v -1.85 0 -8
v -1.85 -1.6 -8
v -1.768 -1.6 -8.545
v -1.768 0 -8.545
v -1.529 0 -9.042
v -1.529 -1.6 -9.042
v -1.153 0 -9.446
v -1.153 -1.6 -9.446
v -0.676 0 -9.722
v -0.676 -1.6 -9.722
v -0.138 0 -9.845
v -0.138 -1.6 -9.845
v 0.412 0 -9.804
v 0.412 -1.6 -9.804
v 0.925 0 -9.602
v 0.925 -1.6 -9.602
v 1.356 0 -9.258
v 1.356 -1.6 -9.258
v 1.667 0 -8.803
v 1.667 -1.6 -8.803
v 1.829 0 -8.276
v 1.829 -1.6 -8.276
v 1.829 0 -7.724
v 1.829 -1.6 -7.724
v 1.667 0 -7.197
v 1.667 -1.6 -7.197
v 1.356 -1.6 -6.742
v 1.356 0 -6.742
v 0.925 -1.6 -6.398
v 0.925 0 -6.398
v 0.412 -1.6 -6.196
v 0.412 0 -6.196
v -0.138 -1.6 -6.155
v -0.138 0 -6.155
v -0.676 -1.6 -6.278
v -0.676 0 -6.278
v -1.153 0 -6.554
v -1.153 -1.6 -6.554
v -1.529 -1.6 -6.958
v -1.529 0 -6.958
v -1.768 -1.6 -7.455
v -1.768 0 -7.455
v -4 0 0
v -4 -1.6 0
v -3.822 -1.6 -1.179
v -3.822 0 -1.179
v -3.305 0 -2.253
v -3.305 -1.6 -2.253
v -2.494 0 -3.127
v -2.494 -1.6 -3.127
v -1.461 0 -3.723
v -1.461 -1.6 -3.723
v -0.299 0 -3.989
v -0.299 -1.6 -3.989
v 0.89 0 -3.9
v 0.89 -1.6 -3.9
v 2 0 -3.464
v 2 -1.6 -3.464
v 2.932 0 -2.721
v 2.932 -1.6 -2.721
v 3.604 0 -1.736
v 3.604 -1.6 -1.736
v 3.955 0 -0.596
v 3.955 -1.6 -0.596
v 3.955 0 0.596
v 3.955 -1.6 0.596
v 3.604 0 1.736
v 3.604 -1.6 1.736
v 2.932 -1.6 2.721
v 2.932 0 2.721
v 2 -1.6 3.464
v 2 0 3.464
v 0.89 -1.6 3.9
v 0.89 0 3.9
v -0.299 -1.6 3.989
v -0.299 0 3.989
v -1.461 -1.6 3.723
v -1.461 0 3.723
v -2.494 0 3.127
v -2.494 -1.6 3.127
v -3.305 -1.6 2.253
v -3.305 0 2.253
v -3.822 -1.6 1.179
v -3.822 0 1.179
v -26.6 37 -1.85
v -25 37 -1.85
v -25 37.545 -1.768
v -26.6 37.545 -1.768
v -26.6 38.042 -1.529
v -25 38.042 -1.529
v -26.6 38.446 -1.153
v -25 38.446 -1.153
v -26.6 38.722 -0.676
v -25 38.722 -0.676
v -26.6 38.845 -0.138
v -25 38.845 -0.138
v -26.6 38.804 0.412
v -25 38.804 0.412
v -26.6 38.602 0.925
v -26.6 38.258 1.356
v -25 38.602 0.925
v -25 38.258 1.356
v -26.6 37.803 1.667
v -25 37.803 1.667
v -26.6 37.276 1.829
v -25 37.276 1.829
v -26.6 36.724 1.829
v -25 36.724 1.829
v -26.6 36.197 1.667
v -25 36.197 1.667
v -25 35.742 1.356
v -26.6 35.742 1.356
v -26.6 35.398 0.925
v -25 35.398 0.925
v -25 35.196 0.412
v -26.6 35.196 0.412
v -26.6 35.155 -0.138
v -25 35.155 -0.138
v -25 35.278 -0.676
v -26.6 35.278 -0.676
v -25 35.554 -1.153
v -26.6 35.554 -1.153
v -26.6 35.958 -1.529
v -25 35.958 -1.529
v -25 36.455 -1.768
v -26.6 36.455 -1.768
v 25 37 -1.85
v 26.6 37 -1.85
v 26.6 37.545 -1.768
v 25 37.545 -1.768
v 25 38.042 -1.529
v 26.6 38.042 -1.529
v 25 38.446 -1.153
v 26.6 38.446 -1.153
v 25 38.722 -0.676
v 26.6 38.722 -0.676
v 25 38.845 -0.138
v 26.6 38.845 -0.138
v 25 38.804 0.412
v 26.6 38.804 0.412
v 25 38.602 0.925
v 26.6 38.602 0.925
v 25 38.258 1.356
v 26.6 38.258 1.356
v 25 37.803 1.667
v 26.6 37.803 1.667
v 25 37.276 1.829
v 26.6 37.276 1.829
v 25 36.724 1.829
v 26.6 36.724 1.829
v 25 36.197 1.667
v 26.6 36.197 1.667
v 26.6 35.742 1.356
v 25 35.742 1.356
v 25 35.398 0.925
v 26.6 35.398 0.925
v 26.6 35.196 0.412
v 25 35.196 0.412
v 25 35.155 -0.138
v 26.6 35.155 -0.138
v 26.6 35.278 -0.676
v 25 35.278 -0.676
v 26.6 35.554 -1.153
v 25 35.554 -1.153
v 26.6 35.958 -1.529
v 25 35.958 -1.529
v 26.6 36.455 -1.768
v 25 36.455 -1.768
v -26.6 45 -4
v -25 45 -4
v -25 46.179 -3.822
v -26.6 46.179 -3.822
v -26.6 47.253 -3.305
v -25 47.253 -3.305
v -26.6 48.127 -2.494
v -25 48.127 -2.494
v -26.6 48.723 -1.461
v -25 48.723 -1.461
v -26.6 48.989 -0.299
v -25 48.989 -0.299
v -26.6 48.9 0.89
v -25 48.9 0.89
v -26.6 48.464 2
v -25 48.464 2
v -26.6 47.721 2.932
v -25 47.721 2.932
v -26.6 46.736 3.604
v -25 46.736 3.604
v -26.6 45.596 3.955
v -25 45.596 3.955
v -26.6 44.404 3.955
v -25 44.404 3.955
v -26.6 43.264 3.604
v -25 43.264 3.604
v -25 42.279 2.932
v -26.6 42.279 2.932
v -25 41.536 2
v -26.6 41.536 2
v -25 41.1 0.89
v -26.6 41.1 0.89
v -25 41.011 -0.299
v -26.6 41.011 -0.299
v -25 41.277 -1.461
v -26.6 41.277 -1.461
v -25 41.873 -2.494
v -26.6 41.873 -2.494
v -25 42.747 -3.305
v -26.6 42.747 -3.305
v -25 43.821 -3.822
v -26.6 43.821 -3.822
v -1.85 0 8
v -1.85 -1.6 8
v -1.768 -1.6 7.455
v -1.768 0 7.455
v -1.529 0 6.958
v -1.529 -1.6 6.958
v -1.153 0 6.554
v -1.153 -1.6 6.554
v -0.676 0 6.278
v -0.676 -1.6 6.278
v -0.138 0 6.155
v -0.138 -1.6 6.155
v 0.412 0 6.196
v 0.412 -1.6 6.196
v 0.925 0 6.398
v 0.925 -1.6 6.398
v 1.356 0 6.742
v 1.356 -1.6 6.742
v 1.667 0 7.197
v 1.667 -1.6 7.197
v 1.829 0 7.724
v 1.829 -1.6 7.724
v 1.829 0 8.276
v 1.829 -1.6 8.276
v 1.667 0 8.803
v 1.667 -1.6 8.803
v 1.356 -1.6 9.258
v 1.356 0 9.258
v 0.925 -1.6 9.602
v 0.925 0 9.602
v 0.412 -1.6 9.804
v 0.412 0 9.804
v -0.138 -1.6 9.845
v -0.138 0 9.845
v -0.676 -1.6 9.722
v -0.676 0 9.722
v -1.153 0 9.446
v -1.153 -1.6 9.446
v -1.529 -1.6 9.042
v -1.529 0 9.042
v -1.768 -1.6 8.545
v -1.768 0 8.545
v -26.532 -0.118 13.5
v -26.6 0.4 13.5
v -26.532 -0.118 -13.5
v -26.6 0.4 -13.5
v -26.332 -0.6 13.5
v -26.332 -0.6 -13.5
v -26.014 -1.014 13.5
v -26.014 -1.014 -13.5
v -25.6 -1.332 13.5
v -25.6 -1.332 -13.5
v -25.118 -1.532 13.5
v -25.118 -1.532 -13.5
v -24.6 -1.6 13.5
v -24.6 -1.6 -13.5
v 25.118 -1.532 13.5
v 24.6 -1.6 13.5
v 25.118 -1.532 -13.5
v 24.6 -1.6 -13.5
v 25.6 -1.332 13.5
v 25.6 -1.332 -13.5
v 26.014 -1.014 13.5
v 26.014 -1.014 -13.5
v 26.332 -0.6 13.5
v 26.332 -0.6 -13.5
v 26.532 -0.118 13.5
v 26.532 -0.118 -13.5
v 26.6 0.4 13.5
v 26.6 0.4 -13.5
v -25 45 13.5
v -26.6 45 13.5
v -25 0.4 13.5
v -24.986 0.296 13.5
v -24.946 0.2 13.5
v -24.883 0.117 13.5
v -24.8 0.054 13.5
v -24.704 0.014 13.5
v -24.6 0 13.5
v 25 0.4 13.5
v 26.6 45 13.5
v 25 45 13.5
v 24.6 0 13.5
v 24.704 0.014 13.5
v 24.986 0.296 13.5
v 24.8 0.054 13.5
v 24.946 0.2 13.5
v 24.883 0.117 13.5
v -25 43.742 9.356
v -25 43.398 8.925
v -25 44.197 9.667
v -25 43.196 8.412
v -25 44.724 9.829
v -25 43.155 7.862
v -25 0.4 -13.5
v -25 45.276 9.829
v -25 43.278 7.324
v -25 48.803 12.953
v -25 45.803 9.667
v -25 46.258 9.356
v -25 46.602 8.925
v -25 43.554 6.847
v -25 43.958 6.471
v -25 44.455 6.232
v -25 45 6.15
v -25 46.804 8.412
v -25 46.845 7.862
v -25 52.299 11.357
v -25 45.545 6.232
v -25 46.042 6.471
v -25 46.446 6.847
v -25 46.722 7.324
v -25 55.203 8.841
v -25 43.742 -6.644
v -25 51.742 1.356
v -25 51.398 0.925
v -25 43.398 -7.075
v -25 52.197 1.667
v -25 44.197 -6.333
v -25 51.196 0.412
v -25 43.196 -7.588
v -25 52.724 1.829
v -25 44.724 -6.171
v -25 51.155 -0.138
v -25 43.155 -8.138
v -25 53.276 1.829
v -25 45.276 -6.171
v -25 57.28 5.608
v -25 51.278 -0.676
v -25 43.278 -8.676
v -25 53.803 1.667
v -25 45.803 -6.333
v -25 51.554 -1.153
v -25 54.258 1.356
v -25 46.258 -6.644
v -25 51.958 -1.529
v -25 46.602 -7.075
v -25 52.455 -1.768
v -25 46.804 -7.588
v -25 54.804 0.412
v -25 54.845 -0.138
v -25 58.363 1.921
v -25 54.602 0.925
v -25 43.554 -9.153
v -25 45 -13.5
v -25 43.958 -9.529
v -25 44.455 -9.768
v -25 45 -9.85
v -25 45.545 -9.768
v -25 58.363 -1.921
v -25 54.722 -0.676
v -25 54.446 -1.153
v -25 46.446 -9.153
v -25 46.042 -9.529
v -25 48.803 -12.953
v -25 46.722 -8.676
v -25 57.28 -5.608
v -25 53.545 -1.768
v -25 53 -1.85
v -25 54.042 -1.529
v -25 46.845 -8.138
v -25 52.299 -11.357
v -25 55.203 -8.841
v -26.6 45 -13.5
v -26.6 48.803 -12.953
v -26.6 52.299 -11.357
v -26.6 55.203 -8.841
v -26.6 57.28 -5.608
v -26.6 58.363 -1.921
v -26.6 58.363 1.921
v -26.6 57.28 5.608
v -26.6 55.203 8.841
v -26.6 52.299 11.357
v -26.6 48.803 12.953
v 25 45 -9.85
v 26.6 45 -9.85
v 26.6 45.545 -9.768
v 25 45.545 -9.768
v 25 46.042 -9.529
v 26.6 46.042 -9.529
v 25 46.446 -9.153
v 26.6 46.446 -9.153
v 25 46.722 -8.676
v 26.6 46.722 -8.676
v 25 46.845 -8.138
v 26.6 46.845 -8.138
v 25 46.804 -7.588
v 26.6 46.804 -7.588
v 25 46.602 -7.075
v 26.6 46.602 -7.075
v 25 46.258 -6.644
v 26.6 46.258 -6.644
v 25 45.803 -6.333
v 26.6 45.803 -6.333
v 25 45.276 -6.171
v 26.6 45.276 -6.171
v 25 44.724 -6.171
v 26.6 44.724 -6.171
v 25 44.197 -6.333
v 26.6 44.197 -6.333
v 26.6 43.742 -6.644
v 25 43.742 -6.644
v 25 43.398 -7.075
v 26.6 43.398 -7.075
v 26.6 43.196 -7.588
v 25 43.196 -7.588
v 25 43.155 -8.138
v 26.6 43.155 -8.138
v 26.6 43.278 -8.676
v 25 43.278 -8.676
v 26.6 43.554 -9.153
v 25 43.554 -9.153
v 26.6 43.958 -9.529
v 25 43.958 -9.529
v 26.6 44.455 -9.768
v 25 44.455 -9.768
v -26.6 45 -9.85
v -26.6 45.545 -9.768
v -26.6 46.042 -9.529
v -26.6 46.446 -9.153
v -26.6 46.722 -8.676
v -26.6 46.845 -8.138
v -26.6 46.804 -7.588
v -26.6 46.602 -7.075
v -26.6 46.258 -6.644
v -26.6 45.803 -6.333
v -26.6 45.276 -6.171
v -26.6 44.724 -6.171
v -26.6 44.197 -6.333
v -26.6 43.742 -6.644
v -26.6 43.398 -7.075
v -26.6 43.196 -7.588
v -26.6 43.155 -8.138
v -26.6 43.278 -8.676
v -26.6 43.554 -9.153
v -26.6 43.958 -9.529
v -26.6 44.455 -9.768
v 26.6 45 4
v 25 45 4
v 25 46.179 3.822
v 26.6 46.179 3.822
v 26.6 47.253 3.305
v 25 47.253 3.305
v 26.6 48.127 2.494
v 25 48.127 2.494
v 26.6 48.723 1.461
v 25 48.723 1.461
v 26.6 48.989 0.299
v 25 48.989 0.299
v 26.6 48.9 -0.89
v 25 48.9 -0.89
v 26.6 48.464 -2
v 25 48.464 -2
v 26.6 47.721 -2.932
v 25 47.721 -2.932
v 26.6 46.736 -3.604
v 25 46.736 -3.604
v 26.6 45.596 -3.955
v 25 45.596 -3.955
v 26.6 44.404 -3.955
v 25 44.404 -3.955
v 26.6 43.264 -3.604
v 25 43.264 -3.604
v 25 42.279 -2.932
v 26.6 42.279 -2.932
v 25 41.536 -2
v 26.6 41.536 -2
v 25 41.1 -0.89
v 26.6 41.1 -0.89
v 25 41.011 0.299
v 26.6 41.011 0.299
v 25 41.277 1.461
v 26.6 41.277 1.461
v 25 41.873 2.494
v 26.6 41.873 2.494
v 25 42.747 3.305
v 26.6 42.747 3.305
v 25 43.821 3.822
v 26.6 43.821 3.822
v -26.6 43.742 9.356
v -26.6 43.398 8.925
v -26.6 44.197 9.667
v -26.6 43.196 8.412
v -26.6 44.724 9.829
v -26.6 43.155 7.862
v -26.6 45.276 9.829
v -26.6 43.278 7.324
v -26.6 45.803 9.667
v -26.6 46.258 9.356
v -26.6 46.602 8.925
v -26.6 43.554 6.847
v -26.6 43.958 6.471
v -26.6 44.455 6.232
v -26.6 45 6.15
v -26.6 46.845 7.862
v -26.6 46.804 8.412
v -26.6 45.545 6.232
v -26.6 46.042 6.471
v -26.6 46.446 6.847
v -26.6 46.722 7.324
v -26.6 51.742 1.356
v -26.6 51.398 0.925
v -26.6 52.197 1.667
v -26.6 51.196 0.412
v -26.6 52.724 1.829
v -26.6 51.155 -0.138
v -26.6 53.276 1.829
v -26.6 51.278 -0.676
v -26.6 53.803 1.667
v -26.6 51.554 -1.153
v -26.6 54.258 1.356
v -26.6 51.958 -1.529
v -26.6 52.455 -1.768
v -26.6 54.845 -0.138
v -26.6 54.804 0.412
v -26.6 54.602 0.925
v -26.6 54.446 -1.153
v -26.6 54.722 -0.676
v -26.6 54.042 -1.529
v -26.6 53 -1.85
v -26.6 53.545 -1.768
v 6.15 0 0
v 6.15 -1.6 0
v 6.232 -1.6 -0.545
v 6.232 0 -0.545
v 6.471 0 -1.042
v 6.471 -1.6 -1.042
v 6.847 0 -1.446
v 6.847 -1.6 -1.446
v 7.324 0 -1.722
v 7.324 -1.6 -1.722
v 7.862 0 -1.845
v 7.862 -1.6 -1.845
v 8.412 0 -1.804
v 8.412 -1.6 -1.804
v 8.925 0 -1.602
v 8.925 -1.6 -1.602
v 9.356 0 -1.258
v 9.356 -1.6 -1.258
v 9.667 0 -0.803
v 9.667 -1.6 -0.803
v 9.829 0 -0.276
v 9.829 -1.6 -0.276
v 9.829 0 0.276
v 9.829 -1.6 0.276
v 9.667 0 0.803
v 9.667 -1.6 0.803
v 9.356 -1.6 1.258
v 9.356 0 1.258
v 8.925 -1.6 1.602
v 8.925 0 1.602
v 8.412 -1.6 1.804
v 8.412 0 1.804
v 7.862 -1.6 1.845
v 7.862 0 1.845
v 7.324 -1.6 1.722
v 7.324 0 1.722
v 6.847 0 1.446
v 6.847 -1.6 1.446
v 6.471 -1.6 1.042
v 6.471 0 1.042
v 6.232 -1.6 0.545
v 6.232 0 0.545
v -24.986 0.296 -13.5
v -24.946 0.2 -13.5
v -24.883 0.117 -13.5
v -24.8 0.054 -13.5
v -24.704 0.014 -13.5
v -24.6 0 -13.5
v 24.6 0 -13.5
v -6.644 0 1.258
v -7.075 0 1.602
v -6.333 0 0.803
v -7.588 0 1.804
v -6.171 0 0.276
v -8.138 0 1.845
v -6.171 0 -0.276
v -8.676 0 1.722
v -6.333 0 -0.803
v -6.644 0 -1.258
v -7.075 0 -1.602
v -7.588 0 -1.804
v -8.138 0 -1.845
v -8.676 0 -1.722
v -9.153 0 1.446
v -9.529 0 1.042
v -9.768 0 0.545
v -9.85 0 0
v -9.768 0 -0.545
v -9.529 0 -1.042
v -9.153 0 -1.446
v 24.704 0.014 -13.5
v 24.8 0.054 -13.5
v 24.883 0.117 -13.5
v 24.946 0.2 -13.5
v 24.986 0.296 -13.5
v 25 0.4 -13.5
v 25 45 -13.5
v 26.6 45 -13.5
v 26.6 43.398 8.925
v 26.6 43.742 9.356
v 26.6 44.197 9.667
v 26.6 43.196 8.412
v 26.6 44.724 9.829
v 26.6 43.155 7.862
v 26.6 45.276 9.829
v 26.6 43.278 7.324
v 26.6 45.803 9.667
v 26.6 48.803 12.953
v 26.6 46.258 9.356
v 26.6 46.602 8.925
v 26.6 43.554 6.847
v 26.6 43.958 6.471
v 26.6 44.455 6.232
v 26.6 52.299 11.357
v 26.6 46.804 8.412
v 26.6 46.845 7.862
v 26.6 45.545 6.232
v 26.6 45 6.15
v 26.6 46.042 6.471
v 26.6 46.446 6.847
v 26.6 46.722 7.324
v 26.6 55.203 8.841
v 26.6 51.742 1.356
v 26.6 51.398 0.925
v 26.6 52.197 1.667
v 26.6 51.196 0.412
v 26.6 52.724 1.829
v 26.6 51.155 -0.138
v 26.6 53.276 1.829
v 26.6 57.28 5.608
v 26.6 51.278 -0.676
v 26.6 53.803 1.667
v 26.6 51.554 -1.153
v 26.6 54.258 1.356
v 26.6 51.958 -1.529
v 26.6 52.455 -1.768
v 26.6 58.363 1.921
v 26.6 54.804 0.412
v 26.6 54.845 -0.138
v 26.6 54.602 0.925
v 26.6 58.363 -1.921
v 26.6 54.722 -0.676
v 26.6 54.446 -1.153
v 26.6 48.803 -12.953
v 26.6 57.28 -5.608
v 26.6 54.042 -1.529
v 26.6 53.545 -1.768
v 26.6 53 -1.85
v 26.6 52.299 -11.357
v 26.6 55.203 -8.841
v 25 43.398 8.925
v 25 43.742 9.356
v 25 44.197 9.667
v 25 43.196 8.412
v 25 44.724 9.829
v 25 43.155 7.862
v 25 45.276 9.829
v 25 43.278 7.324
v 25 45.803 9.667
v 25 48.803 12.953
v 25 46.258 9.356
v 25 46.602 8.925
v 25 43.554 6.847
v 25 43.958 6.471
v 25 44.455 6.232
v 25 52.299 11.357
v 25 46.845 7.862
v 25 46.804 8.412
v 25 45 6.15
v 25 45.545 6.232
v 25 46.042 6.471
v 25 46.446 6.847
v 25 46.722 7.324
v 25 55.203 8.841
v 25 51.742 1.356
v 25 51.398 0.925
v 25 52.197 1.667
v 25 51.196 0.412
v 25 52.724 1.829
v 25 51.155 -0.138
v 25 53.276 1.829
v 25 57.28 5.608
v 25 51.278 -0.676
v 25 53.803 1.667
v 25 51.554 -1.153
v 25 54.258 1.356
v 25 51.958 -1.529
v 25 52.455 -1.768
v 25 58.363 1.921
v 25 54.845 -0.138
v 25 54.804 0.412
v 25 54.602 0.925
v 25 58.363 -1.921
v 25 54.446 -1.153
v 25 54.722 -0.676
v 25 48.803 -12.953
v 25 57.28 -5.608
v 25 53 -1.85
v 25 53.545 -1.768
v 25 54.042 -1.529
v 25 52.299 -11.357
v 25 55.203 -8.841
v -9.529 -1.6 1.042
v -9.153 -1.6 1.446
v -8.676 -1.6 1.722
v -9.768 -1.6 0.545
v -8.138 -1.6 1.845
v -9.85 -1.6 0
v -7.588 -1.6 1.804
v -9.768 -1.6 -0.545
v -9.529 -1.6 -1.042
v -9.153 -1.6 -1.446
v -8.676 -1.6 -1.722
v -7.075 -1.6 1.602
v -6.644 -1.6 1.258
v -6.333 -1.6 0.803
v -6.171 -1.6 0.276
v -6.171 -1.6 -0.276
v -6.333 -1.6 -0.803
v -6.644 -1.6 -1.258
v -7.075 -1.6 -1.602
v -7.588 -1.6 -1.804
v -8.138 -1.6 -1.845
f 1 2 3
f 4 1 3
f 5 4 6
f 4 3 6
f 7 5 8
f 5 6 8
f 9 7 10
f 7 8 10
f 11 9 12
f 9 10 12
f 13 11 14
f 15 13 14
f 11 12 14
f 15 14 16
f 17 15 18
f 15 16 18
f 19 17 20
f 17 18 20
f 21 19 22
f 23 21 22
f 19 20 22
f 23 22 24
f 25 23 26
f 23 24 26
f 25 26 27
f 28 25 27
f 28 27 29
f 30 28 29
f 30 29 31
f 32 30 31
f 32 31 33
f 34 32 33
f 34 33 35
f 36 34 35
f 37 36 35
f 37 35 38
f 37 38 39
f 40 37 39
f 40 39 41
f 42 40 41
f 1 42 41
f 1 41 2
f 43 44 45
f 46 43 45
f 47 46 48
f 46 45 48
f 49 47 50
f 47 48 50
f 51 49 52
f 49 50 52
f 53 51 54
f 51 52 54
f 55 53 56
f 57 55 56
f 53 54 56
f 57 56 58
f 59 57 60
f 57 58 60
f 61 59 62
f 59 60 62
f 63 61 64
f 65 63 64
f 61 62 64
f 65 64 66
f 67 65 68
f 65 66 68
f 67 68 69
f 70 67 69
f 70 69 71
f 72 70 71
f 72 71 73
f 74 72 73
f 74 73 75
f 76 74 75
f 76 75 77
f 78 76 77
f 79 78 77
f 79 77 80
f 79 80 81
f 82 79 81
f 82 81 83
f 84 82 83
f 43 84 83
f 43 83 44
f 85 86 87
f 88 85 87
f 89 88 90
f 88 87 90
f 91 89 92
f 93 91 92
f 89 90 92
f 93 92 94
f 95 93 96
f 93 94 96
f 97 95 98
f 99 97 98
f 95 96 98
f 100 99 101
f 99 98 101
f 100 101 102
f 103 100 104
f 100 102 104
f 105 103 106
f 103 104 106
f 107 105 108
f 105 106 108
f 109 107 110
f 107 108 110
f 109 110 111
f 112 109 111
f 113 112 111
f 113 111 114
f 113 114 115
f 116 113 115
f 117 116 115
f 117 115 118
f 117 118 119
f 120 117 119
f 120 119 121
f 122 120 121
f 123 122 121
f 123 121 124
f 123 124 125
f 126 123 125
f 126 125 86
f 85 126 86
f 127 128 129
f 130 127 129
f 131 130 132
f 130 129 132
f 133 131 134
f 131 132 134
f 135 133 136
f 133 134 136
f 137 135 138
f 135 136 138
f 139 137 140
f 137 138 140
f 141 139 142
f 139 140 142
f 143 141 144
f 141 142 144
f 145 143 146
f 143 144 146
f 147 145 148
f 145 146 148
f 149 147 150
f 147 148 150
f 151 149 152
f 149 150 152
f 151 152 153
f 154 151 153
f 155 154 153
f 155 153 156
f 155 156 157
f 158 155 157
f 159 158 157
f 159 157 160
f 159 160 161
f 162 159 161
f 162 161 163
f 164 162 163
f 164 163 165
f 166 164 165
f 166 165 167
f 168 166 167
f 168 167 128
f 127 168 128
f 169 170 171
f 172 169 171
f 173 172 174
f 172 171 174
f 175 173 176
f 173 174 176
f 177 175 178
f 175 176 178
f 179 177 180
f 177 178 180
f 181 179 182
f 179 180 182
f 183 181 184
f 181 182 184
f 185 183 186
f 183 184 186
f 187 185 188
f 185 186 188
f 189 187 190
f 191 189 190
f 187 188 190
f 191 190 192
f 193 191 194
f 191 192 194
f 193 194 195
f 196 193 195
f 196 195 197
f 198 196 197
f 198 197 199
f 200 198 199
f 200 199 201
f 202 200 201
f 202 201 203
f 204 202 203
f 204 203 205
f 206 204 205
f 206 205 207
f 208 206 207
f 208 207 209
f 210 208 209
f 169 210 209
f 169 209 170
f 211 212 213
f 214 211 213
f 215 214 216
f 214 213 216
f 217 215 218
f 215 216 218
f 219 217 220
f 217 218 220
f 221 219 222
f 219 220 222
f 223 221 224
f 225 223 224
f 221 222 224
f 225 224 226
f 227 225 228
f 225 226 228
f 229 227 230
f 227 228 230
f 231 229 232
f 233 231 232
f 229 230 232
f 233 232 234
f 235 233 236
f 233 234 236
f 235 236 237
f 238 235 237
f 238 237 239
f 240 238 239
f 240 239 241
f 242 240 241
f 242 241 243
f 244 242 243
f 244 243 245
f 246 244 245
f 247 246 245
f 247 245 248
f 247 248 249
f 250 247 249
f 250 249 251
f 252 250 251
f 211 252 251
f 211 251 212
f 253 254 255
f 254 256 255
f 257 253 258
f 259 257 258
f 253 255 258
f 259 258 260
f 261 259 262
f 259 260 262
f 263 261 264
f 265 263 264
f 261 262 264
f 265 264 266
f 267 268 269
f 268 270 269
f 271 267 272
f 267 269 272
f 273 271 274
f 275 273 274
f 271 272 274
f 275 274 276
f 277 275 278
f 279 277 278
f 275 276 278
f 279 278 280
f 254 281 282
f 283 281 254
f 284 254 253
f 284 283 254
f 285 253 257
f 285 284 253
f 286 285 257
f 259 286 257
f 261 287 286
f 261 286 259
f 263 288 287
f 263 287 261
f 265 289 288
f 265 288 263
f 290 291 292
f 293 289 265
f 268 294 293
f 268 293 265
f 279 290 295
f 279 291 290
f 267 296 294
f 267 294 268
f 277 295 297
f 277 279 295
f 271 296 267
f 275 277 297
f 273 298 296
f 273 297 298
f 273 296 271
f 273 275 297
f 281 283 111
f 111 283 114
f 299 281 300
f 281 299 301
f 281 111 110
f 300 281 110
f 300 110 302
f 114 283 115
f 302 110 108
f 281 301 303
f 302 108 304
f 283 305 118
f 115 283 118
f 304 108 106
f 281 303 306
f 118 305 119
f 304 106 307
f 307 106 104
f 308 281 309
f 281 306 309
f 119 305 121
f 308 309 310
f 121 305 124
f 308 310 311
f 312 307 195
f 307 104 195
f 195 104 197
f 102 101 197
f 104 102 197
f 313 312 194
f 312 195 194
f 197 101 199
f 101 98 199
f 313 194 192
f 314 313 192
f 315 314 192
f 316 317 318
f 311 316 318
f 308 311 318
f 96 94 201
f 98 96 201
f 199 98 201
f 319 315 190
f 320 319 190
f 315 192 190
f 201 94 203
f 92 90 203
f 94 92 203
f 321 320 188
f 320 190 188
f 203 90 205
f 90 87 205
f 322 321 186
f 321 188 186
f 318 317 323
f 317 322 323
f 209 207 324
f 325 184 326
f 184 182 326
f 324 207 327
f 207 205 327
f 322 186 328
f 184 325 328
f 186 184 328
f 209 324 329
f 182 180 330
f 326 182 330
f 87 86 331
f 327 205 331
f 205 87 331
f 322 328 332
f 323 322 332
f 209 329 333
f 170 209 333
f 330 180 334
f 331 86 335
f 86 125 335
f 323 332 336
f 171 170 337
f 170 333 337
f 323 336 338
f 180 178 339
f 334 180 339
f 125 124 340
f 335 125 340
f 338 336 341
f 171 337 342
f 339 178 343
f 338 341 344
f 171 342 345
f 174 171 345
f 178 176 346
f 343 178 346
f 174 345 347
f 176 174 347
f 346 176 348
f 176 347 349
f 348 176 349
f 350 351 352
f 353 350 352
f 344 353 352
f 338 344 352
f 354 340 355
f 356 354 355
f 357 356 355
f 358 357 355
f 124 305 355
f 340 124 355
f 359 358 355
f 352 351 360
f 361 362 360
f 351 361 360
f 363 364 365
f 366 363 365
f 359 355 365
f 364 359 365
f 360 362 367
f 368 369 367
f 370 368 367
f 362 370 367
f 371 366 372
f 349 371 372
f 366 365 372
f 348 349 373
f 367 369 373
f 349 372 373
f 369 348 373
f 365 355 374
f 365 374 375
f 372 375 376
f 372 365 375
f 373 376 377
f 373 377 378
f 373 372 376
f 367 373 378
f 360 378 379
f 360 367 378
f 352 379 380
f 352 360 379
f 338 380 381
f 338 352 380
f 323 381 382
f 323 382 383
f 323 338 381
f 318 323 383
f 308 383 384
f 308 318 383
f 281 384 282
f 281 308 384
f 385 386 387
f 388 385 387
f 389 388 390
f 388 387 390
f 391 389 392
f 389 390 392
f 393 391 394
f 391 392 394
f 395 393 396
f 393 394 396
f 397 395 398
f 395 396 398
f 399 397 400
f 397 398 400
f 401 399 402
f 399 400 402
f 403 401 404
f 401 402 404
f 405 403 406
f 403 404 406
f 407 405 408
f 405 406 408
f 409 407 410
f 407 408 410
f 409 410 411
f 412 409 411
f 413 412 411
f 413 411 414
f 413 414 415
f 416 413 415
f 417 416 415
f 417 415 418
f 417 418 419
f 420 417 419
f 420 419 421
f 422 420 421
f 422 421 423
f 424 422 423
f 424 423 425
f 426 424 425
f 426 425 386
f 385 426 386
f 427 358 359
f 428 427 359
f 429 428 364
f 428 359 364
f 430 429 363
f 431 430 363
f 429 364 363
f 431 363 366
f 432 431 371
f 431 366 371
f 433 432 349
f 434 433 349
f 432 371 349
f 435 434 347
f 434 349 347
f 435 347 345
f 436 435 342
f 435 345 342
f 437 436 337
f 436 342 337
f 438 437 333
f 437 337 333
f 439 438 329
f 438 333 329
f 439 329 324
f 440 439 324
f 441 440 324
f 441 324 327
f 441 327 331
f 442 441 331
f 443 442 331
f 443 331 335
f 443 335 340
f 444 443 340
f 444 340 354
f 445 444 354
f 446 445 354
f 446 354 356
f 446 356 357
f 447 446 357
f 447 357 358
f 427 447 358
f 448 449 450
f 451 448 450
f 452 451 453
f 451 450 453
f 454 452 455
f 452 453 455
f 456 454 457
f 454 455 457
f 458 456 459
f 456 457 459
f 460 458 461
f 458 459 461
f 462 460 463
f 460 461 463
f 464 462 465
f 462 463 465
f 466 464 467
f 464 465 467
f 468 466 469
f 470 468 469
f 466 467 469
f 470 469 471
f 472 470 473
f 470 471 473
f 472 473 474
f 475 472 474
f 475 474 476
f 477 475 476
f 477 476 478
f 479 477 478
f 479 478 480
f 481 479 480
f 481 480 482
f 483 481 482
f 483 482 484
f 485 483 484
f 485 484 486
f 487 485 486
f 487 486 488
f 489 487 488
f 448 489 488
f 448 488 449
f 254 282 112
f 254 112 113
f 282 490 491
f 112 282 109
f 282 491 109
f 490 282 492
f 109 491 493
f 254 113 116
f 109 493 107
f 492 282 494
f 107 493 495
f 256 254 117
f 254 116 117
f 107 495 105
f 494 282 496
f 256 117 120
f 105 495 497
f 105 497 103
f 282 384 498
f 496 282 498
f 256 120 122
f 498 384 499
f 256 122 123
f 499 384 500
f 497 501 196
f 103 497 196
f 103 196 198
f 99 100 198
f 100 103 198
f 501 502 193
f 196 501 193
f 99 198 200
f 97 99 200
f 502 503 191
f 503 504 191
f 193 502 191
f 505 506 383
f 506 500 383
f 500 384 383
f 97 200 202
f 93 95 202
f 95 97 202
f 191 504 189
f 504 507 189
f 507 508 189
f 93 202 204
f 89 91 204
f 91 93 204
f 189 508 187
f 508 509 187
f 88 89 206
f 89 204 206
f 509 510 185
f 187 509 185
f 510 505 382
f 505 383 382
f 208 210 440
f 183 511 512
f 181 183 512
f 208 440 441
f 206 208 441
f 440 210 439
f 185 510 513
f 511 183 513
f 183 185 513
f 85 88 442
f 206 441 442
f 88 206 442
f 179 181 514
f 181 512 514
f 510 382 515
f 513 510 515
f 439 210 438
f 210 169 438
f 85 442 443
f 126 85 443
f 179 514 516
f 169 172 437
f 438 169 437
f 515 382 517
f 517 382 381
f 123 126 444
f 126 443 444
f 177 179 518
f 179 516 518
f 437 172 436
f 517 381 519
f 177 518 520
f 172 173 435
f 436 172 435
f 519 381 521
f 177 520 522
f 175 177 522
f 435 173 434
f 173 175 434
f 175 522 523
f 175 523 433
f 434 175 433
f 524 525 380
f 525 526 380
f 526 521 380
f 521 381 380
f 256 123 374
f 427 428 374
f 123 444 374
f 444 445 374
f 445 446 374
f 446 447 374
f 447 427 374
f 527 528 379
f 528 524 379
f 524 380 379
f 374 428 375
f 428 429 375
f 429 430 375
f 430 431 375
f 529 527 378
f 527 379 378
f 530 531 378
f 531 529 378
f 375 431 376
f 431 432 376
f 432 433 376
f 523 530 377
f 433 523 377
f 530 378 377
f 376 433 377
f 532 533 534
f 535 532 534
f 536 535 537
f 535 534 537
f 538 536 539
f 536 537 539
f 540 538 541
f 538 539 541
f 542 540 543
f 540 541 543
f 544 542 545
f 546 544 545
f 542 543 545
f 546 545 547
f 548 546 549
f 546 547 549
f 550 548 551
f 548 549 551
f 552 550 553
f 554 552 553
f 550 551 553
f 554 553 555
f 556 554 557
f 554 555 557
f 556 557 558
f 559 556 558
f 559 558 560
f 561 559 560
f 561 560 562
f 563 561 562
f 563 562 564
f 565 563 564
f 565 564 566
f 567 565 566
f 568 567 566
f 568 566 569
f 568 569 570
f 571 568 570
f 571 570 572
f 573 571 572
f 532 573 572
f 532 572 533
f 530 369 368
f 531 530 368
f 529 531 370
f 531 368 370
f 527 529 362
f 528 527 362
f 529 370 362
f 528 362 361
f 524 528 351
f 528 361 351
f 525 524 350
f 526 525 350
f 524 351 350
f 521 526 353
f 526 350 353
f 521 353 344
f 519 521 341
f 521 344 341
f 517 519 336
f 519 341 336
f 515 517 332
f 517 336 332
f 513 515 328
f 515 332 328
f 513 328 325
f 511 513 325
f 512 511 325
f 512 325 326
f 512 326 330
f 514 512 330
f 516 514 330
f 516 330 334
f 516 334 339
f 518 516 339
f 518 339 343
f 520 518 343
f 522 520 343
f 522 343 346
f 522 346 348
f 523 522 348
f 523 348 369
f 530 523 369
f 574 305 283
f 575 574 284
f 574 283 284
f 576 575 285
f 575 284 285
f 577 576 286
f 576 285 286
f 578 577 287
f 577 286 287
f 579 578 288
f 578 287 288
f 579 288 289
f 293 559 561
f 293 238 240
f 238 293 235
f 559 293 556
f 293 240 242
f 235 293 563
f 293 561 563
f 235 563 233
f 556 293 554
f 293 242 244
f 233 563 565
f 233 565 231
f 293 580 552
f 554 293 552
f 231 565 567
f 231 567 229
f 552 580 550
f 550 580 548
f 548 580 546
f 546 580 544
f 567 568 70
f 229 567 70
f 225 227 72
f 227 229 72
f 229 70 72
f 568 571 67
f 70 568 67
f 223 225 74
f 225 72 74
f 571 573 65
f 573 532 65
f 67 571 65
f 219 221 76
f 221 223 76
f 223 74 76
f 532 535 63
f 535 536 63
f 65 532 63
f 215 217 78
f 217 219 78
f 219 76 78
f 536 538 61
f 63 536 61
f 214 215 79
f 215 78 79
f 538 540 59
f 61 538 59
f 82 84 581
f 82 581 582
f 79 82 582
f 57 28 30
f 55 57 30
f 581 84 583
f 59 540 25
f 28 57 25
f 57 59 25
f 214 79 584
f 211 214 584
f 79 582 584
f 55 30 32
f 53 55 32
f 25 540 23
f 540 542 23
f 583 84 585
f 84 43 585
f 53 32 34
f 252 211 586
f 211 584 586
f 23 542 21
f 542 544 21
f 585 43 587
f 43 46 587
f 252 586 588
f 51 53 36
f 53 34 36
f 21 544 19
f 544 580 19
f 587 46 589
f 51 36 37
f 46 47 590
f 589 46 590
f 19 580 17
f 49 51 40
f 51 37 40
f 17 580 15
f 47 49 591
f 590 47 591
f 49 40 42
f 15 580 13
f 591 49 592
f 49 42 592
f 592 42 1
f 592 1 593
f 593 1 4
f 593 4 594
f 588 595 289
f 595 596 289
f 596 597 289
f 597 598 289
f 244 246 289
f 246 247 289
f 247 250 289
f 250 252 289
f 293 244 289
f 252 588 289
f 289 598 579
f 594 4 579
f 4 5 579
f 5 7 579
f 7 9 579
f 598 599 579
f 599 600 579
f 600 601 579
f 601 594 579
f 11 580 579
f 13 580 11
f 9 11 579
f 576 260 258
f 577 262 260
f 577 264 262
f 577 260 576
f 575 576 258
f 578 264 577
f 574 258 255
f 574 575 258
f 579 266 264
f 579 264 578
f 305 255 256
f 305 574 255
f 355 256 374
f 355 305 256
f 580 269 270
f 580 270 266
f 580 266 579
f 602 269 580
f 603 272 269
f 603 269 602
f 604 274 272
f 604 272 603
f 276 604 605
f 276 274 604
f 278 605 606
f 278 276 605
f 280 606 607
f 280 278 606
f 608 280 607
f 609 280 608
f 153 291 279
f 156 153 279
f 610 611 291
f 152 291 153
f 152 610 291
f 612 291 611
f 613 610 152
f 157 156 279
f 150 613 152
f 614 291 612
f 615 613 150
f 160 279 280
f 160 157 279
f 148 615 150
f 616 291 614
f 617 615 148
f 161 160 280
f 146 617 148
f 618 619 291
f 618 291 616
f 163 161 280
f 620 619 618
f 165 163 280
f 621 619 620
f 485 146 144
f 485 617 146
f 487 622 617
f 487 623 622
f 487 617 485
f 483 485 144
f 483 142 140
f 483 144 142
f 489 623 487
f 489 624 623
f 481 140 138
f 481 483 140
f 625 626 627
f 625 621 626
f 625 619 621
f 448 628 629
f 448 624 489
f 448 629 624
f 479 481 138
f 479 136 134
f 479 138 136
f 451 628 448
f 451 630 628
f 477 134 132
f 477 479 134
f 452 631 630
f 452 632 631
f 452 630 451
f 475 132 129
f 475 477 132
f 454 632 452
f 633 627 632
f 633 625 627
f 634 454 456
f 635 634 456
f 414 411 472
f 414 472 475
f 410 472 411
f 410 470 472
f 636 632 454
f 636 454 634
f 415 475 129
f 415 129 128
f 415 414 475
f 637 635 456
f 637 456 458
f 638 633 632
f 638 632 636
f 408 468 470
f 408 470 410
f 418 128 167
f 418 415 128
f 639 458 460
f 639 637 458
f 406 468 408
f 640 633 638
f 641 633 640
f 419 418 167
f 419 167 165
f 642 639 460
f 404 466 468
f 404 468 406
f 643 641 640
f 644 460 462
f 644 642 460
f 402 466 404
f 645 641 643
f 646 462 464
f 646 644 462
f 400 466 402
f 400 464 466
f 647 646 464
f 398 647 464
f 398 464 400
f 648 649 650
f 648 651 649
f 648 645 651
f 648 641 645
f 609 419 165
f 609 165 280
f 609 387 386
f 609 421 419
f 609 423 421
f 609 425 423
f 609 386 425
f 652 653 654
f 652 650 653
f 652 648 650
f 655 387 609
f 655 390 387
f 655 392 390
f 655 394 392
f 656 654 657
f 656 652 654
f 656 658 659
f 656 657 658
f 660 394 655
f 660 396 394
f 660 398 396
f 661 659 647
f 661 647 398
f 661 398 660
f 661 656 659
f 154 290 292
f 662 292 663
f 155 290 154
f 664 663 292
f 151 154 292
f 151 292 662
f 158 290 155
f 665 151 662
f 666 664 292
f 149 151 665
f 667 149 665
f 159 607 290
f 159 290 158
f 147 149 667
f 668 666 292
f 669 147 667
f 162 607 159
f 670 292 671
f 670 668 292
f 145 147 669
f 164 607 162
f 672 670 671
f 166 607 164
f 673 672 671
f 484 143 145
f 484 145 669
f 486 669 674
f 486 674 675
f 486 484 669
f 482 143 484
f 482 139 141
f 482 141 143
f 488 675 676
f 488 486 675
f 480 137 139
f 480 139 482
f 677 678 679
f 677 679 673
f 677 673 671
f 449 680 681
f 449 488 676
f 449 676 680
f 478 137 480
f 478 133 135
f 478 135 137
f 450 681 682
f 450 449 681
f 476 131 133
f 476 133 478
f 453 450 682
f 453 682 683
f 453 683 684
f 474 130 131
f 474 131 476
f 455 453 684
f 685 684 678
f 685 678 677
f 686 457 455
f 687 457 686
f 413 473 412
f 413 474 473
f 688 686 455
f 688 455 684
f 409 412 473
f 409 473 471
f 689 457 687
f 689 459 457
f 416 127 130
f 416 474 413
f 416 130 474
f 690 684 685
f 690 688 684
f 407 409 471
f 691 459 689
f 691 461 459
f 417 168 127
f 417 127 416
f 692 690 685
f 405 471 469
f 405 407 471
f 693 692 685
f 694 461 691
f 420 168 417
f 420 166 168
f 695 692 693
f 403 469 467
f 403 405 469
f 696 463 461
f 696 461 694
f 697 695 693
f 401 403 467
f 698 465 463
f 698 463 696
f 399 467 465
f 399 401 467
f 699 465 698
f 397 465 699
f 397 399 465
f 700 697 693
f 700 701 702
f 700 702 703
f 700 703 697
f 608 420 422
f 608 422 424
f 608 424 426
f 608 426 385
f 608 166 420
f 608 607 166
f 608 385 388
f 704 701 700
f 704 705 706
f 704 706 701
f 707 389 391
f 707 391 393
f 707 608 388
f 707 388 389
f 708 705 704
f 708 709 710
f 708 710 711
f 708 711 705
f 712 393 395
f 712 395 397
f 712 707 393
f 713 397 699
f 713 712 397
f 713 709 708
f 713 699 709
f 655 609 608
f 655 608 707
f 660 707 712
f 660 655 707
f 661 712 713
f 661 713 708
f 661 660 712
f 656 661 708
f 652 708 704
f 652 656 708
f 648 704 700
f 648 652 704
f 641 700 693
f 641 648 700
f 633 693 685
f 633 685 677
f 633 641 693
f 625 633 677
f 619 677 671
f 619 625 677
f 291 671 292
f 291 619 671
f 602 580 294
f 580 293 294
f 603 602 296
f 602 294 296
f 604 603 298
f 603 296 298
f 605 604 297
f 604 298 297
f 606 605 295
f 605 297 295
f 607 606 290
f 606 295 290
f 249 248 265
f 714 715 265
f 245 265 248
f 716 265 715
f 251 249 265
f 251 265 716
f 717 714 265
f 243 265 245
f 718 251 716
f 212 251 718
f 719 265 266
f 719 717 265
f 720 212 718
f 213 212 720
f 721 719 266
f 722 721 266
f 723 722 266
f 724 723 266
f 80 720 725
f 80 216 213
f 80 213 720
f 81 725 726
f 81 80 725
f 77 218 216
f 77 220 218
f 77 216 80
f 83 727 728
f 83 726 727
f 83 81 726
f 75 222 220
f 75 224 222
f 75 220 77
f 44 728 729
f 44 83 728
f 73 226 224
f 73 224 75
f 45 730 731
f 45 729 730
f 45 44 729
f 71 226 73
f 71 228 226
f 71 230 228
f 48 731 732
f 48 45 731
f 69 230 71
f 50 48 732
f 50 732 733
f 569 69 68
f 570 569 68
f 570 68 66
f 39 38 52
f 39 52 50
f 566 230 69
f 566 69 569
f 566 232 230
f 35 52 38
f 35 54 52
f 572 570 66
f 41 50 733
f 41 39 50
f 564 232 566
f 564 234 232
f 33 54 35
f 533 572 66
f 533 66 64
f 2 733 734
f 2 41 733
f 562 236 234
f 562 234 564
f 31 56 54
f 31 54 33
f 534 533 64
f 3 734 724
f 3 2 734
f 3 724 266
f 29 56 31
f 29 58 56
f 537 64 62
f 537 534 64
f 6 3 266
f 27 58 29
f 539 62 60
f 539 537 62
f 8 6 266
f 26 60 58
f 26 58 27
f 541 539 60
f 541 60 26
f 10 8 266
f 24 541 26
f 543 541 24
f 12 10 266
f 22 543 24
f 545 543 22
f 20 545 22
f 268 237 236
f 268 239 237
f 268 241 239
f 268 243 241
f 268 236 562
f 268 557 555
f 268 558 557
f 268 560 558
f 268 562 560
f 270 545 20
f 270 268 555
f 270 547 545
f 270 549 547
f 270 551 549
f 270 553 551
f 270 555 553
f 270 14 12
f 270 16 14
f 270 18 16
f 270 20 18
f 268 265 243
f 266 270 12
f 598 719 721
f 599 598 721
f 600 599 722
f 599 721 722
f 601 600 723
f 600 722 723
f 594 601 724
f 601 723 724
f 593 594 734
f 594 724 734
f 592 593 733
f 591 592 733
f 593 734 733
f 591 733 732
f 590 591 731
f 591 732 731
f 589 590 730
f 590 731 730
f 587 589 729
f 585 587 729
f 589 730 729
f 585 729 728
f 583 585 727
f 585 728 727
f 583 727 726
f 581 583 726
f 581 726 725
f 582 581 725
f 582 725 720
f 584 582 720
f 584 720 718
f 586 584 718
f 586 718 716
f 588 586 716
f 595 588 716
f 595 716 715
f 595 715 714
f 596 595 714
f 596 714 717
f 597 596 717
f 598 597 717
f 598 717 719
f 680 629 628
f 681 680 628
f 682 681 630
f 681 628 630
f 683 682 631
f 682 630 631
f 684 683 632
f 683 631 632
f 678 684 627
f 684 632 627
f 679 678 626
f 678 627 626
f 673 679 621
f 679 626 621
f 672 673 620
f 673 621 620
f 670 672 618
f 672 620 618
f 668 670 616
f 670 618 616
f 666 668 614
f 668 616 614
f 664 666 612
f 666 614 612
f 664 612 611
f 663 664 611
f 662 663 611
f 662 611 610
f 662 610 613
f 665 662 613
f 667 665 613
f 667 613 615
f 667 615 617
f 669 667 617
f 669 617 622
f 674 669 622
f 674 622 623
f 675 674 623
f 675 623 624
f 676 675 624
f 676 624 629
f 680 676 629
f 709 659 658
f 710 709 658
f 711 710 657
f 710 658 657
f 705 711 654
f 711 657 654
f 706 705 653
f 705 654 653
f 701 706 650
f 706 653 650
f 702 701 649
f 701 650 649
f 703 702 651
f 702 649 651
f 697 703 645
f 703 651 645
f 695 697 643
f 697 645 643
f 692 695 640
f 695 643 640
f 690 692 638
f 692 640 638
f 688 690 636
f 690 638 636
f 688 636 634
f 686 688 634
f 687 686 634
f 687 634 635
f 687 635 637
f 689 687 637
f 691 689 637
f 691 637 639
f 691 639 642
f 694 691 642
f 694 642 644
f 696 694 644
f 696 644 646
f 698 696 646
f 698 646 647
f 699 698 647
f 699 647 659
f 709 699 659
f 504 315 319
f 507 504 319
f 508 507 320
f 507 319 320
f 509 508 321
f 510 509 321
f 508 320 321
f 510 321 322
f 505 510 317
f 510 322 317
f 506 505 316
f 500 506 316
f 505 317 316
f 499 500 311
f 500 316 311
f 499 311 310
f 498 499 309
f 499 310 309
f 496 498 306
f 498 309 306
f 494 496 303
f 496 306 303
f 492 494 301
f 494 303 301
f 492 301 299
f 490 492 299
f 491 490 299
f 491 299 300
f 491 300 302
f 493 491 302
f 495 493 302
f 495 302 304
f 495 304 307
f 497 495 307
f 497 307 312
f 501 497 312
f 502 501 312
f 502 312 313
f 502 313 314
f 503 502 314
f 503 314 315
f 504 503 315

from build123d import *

# Parameters (mm, degrees)
BOSS_EXTRUDE1_DEPTH            = 53.2
SKETCH2_W                      = 50
SKETCH2_H                      = 63.5
CUT_EXTRUDE1_DEPTH             = 28
F_8_0_8_DIAMETER_HOLE1_D       = 8
F_8_0_8_DIAMETER_HOLE1_DEPTH   = 1.6
F_3_7_3_7_DIAMETER_HOLE1_D     = 3.7
F_3_7_3_7_DIAMETER_HOLE2_D     = 3.7
F_3_7_3_7_DIAMETER_HOLE2_DEPTH = 1.6
F_8_0_8_DIAMETER_HOLE2_D       = 8
F_8_0_8_DIAMETER_HOLE2_DEPTH   = 1.6
F_8_0_8_DIAMETER_HOLE3_D       = 8
F_8_0_8_DIAMETER_HOLE3_DEPTH   = 1.6
FILLET1_R                      = 0.4
FILLET2_R                      = 2


with BuildPart() as part:
    # Sketch1 → Boss-Extrude1 (new body)
    with BuildSketch(Plane(origin=(26.6, 0, 0), x_dir=(0, 0, -1), z_dir=(1, 0, 0))):
        with BuildLine():
            Line((-13.5, 45), (-13.5, -1.6))
            Line((-13.5, -1.6), (13.5, -1.6))
            Line((13.5, -1.6), (13.5, 45))
            ThreePointArc((13.5, 45), (0, 58.5), (-13.5, 45))
        make_face()
    extrude(amount=-BOSS_EXTRUDE1_DEPTH)

    # Sketch2 → Cut-Extrude1 (cut, through all)
    with BuildSketch(Plane(origin=(0, 0, -13.5), x_dir=(-1, 0, 0), z_dir=(0, 0, -1))):
        with Locations((0, 31.75)):
            Rectangle(SKETCH2_W, SKETCH2_H)
    extrude(amount=-CUT_EXTRUDE1_DEPTH, mode=Mode.SUBTRACT)

    # Ø8.0 (8) Diameter Hole1
    with Locations(Plane.ZY.offset(26.6)):
        with Locations((0, 45)):
            Hole(F_8_0_8_DIAMETER_HOLE1_D / 2, depth=F_8_0_8_DIAMETER_HOLE1_DEPTH)

    # Ø3.7 (3.7) Diameter Hole1 (through all)
    with Locations(Plane.ZY.offset(26.6)):
        with Locations((0, 53), (-8, 45), (0, 37), (8, 45)):
            Hole(F_3_7_3_7_DIAMETER_HOLE1_D / 2)

    # Ø3.7 (3.7) Diameter Hole2
    with Locations(Plane(origin=(0, 0, 0), x_dir=(1, 0, 0), z_dir=(0, 1, 0))):
        with Locations((0, 8), (8, 0), (0, -8), (-8, 0)):
            Hole(F_3_7_3_7_DIAMETER_HOLE2_D / 2, depth=F_3_7_3_7_DIAMETER_HOLE2_DEPTH)

    # Ø8.0 (8) Diameter Hole2
    with Locations(Plane(origin=(0, 0, 0), x_dir=(1, 0, 0), z_dir=(0, 1, 0))):
        with Locations((0, 0)):
            Hole(F_8_0_8_DIAMETER_HOLE2_D / 2, depth=F_8_0_8_DIAMETER_HOLE2_DEPTH)

    # Ø8.0 (8) Diameter Hole3
    with Locations(Plane(origin=(26.6, 0, 0), x_dir=(0, 0, -1), z_dir=(1, 0, 0))):
        with Locations((0, 45)):
            Hole(F_8_0_8_DIAMETER_HOLE3_D / 2, depth=F_8_0_8_DIAMETER_HOLE3_DEPTH)

    # Fillet1
    fillet1_edges = [part.edges().sort_by_distance(p)[0] for p in [
        (-25, 0, 0),
        (25, 0, 0),
    ]]
    fillet(fillet1_edges, radius=FILLET1_R)

    # Fillet2
    fillet2_edges = [part.edges().sort_by_distance(p)[0] for p in [
        (-26.6, -1.6, 0),
        (26.6, -1.6, 0),
    ]]
    fillet(fillet2_edges, radius=FILLET2_R)


solid = part.part
